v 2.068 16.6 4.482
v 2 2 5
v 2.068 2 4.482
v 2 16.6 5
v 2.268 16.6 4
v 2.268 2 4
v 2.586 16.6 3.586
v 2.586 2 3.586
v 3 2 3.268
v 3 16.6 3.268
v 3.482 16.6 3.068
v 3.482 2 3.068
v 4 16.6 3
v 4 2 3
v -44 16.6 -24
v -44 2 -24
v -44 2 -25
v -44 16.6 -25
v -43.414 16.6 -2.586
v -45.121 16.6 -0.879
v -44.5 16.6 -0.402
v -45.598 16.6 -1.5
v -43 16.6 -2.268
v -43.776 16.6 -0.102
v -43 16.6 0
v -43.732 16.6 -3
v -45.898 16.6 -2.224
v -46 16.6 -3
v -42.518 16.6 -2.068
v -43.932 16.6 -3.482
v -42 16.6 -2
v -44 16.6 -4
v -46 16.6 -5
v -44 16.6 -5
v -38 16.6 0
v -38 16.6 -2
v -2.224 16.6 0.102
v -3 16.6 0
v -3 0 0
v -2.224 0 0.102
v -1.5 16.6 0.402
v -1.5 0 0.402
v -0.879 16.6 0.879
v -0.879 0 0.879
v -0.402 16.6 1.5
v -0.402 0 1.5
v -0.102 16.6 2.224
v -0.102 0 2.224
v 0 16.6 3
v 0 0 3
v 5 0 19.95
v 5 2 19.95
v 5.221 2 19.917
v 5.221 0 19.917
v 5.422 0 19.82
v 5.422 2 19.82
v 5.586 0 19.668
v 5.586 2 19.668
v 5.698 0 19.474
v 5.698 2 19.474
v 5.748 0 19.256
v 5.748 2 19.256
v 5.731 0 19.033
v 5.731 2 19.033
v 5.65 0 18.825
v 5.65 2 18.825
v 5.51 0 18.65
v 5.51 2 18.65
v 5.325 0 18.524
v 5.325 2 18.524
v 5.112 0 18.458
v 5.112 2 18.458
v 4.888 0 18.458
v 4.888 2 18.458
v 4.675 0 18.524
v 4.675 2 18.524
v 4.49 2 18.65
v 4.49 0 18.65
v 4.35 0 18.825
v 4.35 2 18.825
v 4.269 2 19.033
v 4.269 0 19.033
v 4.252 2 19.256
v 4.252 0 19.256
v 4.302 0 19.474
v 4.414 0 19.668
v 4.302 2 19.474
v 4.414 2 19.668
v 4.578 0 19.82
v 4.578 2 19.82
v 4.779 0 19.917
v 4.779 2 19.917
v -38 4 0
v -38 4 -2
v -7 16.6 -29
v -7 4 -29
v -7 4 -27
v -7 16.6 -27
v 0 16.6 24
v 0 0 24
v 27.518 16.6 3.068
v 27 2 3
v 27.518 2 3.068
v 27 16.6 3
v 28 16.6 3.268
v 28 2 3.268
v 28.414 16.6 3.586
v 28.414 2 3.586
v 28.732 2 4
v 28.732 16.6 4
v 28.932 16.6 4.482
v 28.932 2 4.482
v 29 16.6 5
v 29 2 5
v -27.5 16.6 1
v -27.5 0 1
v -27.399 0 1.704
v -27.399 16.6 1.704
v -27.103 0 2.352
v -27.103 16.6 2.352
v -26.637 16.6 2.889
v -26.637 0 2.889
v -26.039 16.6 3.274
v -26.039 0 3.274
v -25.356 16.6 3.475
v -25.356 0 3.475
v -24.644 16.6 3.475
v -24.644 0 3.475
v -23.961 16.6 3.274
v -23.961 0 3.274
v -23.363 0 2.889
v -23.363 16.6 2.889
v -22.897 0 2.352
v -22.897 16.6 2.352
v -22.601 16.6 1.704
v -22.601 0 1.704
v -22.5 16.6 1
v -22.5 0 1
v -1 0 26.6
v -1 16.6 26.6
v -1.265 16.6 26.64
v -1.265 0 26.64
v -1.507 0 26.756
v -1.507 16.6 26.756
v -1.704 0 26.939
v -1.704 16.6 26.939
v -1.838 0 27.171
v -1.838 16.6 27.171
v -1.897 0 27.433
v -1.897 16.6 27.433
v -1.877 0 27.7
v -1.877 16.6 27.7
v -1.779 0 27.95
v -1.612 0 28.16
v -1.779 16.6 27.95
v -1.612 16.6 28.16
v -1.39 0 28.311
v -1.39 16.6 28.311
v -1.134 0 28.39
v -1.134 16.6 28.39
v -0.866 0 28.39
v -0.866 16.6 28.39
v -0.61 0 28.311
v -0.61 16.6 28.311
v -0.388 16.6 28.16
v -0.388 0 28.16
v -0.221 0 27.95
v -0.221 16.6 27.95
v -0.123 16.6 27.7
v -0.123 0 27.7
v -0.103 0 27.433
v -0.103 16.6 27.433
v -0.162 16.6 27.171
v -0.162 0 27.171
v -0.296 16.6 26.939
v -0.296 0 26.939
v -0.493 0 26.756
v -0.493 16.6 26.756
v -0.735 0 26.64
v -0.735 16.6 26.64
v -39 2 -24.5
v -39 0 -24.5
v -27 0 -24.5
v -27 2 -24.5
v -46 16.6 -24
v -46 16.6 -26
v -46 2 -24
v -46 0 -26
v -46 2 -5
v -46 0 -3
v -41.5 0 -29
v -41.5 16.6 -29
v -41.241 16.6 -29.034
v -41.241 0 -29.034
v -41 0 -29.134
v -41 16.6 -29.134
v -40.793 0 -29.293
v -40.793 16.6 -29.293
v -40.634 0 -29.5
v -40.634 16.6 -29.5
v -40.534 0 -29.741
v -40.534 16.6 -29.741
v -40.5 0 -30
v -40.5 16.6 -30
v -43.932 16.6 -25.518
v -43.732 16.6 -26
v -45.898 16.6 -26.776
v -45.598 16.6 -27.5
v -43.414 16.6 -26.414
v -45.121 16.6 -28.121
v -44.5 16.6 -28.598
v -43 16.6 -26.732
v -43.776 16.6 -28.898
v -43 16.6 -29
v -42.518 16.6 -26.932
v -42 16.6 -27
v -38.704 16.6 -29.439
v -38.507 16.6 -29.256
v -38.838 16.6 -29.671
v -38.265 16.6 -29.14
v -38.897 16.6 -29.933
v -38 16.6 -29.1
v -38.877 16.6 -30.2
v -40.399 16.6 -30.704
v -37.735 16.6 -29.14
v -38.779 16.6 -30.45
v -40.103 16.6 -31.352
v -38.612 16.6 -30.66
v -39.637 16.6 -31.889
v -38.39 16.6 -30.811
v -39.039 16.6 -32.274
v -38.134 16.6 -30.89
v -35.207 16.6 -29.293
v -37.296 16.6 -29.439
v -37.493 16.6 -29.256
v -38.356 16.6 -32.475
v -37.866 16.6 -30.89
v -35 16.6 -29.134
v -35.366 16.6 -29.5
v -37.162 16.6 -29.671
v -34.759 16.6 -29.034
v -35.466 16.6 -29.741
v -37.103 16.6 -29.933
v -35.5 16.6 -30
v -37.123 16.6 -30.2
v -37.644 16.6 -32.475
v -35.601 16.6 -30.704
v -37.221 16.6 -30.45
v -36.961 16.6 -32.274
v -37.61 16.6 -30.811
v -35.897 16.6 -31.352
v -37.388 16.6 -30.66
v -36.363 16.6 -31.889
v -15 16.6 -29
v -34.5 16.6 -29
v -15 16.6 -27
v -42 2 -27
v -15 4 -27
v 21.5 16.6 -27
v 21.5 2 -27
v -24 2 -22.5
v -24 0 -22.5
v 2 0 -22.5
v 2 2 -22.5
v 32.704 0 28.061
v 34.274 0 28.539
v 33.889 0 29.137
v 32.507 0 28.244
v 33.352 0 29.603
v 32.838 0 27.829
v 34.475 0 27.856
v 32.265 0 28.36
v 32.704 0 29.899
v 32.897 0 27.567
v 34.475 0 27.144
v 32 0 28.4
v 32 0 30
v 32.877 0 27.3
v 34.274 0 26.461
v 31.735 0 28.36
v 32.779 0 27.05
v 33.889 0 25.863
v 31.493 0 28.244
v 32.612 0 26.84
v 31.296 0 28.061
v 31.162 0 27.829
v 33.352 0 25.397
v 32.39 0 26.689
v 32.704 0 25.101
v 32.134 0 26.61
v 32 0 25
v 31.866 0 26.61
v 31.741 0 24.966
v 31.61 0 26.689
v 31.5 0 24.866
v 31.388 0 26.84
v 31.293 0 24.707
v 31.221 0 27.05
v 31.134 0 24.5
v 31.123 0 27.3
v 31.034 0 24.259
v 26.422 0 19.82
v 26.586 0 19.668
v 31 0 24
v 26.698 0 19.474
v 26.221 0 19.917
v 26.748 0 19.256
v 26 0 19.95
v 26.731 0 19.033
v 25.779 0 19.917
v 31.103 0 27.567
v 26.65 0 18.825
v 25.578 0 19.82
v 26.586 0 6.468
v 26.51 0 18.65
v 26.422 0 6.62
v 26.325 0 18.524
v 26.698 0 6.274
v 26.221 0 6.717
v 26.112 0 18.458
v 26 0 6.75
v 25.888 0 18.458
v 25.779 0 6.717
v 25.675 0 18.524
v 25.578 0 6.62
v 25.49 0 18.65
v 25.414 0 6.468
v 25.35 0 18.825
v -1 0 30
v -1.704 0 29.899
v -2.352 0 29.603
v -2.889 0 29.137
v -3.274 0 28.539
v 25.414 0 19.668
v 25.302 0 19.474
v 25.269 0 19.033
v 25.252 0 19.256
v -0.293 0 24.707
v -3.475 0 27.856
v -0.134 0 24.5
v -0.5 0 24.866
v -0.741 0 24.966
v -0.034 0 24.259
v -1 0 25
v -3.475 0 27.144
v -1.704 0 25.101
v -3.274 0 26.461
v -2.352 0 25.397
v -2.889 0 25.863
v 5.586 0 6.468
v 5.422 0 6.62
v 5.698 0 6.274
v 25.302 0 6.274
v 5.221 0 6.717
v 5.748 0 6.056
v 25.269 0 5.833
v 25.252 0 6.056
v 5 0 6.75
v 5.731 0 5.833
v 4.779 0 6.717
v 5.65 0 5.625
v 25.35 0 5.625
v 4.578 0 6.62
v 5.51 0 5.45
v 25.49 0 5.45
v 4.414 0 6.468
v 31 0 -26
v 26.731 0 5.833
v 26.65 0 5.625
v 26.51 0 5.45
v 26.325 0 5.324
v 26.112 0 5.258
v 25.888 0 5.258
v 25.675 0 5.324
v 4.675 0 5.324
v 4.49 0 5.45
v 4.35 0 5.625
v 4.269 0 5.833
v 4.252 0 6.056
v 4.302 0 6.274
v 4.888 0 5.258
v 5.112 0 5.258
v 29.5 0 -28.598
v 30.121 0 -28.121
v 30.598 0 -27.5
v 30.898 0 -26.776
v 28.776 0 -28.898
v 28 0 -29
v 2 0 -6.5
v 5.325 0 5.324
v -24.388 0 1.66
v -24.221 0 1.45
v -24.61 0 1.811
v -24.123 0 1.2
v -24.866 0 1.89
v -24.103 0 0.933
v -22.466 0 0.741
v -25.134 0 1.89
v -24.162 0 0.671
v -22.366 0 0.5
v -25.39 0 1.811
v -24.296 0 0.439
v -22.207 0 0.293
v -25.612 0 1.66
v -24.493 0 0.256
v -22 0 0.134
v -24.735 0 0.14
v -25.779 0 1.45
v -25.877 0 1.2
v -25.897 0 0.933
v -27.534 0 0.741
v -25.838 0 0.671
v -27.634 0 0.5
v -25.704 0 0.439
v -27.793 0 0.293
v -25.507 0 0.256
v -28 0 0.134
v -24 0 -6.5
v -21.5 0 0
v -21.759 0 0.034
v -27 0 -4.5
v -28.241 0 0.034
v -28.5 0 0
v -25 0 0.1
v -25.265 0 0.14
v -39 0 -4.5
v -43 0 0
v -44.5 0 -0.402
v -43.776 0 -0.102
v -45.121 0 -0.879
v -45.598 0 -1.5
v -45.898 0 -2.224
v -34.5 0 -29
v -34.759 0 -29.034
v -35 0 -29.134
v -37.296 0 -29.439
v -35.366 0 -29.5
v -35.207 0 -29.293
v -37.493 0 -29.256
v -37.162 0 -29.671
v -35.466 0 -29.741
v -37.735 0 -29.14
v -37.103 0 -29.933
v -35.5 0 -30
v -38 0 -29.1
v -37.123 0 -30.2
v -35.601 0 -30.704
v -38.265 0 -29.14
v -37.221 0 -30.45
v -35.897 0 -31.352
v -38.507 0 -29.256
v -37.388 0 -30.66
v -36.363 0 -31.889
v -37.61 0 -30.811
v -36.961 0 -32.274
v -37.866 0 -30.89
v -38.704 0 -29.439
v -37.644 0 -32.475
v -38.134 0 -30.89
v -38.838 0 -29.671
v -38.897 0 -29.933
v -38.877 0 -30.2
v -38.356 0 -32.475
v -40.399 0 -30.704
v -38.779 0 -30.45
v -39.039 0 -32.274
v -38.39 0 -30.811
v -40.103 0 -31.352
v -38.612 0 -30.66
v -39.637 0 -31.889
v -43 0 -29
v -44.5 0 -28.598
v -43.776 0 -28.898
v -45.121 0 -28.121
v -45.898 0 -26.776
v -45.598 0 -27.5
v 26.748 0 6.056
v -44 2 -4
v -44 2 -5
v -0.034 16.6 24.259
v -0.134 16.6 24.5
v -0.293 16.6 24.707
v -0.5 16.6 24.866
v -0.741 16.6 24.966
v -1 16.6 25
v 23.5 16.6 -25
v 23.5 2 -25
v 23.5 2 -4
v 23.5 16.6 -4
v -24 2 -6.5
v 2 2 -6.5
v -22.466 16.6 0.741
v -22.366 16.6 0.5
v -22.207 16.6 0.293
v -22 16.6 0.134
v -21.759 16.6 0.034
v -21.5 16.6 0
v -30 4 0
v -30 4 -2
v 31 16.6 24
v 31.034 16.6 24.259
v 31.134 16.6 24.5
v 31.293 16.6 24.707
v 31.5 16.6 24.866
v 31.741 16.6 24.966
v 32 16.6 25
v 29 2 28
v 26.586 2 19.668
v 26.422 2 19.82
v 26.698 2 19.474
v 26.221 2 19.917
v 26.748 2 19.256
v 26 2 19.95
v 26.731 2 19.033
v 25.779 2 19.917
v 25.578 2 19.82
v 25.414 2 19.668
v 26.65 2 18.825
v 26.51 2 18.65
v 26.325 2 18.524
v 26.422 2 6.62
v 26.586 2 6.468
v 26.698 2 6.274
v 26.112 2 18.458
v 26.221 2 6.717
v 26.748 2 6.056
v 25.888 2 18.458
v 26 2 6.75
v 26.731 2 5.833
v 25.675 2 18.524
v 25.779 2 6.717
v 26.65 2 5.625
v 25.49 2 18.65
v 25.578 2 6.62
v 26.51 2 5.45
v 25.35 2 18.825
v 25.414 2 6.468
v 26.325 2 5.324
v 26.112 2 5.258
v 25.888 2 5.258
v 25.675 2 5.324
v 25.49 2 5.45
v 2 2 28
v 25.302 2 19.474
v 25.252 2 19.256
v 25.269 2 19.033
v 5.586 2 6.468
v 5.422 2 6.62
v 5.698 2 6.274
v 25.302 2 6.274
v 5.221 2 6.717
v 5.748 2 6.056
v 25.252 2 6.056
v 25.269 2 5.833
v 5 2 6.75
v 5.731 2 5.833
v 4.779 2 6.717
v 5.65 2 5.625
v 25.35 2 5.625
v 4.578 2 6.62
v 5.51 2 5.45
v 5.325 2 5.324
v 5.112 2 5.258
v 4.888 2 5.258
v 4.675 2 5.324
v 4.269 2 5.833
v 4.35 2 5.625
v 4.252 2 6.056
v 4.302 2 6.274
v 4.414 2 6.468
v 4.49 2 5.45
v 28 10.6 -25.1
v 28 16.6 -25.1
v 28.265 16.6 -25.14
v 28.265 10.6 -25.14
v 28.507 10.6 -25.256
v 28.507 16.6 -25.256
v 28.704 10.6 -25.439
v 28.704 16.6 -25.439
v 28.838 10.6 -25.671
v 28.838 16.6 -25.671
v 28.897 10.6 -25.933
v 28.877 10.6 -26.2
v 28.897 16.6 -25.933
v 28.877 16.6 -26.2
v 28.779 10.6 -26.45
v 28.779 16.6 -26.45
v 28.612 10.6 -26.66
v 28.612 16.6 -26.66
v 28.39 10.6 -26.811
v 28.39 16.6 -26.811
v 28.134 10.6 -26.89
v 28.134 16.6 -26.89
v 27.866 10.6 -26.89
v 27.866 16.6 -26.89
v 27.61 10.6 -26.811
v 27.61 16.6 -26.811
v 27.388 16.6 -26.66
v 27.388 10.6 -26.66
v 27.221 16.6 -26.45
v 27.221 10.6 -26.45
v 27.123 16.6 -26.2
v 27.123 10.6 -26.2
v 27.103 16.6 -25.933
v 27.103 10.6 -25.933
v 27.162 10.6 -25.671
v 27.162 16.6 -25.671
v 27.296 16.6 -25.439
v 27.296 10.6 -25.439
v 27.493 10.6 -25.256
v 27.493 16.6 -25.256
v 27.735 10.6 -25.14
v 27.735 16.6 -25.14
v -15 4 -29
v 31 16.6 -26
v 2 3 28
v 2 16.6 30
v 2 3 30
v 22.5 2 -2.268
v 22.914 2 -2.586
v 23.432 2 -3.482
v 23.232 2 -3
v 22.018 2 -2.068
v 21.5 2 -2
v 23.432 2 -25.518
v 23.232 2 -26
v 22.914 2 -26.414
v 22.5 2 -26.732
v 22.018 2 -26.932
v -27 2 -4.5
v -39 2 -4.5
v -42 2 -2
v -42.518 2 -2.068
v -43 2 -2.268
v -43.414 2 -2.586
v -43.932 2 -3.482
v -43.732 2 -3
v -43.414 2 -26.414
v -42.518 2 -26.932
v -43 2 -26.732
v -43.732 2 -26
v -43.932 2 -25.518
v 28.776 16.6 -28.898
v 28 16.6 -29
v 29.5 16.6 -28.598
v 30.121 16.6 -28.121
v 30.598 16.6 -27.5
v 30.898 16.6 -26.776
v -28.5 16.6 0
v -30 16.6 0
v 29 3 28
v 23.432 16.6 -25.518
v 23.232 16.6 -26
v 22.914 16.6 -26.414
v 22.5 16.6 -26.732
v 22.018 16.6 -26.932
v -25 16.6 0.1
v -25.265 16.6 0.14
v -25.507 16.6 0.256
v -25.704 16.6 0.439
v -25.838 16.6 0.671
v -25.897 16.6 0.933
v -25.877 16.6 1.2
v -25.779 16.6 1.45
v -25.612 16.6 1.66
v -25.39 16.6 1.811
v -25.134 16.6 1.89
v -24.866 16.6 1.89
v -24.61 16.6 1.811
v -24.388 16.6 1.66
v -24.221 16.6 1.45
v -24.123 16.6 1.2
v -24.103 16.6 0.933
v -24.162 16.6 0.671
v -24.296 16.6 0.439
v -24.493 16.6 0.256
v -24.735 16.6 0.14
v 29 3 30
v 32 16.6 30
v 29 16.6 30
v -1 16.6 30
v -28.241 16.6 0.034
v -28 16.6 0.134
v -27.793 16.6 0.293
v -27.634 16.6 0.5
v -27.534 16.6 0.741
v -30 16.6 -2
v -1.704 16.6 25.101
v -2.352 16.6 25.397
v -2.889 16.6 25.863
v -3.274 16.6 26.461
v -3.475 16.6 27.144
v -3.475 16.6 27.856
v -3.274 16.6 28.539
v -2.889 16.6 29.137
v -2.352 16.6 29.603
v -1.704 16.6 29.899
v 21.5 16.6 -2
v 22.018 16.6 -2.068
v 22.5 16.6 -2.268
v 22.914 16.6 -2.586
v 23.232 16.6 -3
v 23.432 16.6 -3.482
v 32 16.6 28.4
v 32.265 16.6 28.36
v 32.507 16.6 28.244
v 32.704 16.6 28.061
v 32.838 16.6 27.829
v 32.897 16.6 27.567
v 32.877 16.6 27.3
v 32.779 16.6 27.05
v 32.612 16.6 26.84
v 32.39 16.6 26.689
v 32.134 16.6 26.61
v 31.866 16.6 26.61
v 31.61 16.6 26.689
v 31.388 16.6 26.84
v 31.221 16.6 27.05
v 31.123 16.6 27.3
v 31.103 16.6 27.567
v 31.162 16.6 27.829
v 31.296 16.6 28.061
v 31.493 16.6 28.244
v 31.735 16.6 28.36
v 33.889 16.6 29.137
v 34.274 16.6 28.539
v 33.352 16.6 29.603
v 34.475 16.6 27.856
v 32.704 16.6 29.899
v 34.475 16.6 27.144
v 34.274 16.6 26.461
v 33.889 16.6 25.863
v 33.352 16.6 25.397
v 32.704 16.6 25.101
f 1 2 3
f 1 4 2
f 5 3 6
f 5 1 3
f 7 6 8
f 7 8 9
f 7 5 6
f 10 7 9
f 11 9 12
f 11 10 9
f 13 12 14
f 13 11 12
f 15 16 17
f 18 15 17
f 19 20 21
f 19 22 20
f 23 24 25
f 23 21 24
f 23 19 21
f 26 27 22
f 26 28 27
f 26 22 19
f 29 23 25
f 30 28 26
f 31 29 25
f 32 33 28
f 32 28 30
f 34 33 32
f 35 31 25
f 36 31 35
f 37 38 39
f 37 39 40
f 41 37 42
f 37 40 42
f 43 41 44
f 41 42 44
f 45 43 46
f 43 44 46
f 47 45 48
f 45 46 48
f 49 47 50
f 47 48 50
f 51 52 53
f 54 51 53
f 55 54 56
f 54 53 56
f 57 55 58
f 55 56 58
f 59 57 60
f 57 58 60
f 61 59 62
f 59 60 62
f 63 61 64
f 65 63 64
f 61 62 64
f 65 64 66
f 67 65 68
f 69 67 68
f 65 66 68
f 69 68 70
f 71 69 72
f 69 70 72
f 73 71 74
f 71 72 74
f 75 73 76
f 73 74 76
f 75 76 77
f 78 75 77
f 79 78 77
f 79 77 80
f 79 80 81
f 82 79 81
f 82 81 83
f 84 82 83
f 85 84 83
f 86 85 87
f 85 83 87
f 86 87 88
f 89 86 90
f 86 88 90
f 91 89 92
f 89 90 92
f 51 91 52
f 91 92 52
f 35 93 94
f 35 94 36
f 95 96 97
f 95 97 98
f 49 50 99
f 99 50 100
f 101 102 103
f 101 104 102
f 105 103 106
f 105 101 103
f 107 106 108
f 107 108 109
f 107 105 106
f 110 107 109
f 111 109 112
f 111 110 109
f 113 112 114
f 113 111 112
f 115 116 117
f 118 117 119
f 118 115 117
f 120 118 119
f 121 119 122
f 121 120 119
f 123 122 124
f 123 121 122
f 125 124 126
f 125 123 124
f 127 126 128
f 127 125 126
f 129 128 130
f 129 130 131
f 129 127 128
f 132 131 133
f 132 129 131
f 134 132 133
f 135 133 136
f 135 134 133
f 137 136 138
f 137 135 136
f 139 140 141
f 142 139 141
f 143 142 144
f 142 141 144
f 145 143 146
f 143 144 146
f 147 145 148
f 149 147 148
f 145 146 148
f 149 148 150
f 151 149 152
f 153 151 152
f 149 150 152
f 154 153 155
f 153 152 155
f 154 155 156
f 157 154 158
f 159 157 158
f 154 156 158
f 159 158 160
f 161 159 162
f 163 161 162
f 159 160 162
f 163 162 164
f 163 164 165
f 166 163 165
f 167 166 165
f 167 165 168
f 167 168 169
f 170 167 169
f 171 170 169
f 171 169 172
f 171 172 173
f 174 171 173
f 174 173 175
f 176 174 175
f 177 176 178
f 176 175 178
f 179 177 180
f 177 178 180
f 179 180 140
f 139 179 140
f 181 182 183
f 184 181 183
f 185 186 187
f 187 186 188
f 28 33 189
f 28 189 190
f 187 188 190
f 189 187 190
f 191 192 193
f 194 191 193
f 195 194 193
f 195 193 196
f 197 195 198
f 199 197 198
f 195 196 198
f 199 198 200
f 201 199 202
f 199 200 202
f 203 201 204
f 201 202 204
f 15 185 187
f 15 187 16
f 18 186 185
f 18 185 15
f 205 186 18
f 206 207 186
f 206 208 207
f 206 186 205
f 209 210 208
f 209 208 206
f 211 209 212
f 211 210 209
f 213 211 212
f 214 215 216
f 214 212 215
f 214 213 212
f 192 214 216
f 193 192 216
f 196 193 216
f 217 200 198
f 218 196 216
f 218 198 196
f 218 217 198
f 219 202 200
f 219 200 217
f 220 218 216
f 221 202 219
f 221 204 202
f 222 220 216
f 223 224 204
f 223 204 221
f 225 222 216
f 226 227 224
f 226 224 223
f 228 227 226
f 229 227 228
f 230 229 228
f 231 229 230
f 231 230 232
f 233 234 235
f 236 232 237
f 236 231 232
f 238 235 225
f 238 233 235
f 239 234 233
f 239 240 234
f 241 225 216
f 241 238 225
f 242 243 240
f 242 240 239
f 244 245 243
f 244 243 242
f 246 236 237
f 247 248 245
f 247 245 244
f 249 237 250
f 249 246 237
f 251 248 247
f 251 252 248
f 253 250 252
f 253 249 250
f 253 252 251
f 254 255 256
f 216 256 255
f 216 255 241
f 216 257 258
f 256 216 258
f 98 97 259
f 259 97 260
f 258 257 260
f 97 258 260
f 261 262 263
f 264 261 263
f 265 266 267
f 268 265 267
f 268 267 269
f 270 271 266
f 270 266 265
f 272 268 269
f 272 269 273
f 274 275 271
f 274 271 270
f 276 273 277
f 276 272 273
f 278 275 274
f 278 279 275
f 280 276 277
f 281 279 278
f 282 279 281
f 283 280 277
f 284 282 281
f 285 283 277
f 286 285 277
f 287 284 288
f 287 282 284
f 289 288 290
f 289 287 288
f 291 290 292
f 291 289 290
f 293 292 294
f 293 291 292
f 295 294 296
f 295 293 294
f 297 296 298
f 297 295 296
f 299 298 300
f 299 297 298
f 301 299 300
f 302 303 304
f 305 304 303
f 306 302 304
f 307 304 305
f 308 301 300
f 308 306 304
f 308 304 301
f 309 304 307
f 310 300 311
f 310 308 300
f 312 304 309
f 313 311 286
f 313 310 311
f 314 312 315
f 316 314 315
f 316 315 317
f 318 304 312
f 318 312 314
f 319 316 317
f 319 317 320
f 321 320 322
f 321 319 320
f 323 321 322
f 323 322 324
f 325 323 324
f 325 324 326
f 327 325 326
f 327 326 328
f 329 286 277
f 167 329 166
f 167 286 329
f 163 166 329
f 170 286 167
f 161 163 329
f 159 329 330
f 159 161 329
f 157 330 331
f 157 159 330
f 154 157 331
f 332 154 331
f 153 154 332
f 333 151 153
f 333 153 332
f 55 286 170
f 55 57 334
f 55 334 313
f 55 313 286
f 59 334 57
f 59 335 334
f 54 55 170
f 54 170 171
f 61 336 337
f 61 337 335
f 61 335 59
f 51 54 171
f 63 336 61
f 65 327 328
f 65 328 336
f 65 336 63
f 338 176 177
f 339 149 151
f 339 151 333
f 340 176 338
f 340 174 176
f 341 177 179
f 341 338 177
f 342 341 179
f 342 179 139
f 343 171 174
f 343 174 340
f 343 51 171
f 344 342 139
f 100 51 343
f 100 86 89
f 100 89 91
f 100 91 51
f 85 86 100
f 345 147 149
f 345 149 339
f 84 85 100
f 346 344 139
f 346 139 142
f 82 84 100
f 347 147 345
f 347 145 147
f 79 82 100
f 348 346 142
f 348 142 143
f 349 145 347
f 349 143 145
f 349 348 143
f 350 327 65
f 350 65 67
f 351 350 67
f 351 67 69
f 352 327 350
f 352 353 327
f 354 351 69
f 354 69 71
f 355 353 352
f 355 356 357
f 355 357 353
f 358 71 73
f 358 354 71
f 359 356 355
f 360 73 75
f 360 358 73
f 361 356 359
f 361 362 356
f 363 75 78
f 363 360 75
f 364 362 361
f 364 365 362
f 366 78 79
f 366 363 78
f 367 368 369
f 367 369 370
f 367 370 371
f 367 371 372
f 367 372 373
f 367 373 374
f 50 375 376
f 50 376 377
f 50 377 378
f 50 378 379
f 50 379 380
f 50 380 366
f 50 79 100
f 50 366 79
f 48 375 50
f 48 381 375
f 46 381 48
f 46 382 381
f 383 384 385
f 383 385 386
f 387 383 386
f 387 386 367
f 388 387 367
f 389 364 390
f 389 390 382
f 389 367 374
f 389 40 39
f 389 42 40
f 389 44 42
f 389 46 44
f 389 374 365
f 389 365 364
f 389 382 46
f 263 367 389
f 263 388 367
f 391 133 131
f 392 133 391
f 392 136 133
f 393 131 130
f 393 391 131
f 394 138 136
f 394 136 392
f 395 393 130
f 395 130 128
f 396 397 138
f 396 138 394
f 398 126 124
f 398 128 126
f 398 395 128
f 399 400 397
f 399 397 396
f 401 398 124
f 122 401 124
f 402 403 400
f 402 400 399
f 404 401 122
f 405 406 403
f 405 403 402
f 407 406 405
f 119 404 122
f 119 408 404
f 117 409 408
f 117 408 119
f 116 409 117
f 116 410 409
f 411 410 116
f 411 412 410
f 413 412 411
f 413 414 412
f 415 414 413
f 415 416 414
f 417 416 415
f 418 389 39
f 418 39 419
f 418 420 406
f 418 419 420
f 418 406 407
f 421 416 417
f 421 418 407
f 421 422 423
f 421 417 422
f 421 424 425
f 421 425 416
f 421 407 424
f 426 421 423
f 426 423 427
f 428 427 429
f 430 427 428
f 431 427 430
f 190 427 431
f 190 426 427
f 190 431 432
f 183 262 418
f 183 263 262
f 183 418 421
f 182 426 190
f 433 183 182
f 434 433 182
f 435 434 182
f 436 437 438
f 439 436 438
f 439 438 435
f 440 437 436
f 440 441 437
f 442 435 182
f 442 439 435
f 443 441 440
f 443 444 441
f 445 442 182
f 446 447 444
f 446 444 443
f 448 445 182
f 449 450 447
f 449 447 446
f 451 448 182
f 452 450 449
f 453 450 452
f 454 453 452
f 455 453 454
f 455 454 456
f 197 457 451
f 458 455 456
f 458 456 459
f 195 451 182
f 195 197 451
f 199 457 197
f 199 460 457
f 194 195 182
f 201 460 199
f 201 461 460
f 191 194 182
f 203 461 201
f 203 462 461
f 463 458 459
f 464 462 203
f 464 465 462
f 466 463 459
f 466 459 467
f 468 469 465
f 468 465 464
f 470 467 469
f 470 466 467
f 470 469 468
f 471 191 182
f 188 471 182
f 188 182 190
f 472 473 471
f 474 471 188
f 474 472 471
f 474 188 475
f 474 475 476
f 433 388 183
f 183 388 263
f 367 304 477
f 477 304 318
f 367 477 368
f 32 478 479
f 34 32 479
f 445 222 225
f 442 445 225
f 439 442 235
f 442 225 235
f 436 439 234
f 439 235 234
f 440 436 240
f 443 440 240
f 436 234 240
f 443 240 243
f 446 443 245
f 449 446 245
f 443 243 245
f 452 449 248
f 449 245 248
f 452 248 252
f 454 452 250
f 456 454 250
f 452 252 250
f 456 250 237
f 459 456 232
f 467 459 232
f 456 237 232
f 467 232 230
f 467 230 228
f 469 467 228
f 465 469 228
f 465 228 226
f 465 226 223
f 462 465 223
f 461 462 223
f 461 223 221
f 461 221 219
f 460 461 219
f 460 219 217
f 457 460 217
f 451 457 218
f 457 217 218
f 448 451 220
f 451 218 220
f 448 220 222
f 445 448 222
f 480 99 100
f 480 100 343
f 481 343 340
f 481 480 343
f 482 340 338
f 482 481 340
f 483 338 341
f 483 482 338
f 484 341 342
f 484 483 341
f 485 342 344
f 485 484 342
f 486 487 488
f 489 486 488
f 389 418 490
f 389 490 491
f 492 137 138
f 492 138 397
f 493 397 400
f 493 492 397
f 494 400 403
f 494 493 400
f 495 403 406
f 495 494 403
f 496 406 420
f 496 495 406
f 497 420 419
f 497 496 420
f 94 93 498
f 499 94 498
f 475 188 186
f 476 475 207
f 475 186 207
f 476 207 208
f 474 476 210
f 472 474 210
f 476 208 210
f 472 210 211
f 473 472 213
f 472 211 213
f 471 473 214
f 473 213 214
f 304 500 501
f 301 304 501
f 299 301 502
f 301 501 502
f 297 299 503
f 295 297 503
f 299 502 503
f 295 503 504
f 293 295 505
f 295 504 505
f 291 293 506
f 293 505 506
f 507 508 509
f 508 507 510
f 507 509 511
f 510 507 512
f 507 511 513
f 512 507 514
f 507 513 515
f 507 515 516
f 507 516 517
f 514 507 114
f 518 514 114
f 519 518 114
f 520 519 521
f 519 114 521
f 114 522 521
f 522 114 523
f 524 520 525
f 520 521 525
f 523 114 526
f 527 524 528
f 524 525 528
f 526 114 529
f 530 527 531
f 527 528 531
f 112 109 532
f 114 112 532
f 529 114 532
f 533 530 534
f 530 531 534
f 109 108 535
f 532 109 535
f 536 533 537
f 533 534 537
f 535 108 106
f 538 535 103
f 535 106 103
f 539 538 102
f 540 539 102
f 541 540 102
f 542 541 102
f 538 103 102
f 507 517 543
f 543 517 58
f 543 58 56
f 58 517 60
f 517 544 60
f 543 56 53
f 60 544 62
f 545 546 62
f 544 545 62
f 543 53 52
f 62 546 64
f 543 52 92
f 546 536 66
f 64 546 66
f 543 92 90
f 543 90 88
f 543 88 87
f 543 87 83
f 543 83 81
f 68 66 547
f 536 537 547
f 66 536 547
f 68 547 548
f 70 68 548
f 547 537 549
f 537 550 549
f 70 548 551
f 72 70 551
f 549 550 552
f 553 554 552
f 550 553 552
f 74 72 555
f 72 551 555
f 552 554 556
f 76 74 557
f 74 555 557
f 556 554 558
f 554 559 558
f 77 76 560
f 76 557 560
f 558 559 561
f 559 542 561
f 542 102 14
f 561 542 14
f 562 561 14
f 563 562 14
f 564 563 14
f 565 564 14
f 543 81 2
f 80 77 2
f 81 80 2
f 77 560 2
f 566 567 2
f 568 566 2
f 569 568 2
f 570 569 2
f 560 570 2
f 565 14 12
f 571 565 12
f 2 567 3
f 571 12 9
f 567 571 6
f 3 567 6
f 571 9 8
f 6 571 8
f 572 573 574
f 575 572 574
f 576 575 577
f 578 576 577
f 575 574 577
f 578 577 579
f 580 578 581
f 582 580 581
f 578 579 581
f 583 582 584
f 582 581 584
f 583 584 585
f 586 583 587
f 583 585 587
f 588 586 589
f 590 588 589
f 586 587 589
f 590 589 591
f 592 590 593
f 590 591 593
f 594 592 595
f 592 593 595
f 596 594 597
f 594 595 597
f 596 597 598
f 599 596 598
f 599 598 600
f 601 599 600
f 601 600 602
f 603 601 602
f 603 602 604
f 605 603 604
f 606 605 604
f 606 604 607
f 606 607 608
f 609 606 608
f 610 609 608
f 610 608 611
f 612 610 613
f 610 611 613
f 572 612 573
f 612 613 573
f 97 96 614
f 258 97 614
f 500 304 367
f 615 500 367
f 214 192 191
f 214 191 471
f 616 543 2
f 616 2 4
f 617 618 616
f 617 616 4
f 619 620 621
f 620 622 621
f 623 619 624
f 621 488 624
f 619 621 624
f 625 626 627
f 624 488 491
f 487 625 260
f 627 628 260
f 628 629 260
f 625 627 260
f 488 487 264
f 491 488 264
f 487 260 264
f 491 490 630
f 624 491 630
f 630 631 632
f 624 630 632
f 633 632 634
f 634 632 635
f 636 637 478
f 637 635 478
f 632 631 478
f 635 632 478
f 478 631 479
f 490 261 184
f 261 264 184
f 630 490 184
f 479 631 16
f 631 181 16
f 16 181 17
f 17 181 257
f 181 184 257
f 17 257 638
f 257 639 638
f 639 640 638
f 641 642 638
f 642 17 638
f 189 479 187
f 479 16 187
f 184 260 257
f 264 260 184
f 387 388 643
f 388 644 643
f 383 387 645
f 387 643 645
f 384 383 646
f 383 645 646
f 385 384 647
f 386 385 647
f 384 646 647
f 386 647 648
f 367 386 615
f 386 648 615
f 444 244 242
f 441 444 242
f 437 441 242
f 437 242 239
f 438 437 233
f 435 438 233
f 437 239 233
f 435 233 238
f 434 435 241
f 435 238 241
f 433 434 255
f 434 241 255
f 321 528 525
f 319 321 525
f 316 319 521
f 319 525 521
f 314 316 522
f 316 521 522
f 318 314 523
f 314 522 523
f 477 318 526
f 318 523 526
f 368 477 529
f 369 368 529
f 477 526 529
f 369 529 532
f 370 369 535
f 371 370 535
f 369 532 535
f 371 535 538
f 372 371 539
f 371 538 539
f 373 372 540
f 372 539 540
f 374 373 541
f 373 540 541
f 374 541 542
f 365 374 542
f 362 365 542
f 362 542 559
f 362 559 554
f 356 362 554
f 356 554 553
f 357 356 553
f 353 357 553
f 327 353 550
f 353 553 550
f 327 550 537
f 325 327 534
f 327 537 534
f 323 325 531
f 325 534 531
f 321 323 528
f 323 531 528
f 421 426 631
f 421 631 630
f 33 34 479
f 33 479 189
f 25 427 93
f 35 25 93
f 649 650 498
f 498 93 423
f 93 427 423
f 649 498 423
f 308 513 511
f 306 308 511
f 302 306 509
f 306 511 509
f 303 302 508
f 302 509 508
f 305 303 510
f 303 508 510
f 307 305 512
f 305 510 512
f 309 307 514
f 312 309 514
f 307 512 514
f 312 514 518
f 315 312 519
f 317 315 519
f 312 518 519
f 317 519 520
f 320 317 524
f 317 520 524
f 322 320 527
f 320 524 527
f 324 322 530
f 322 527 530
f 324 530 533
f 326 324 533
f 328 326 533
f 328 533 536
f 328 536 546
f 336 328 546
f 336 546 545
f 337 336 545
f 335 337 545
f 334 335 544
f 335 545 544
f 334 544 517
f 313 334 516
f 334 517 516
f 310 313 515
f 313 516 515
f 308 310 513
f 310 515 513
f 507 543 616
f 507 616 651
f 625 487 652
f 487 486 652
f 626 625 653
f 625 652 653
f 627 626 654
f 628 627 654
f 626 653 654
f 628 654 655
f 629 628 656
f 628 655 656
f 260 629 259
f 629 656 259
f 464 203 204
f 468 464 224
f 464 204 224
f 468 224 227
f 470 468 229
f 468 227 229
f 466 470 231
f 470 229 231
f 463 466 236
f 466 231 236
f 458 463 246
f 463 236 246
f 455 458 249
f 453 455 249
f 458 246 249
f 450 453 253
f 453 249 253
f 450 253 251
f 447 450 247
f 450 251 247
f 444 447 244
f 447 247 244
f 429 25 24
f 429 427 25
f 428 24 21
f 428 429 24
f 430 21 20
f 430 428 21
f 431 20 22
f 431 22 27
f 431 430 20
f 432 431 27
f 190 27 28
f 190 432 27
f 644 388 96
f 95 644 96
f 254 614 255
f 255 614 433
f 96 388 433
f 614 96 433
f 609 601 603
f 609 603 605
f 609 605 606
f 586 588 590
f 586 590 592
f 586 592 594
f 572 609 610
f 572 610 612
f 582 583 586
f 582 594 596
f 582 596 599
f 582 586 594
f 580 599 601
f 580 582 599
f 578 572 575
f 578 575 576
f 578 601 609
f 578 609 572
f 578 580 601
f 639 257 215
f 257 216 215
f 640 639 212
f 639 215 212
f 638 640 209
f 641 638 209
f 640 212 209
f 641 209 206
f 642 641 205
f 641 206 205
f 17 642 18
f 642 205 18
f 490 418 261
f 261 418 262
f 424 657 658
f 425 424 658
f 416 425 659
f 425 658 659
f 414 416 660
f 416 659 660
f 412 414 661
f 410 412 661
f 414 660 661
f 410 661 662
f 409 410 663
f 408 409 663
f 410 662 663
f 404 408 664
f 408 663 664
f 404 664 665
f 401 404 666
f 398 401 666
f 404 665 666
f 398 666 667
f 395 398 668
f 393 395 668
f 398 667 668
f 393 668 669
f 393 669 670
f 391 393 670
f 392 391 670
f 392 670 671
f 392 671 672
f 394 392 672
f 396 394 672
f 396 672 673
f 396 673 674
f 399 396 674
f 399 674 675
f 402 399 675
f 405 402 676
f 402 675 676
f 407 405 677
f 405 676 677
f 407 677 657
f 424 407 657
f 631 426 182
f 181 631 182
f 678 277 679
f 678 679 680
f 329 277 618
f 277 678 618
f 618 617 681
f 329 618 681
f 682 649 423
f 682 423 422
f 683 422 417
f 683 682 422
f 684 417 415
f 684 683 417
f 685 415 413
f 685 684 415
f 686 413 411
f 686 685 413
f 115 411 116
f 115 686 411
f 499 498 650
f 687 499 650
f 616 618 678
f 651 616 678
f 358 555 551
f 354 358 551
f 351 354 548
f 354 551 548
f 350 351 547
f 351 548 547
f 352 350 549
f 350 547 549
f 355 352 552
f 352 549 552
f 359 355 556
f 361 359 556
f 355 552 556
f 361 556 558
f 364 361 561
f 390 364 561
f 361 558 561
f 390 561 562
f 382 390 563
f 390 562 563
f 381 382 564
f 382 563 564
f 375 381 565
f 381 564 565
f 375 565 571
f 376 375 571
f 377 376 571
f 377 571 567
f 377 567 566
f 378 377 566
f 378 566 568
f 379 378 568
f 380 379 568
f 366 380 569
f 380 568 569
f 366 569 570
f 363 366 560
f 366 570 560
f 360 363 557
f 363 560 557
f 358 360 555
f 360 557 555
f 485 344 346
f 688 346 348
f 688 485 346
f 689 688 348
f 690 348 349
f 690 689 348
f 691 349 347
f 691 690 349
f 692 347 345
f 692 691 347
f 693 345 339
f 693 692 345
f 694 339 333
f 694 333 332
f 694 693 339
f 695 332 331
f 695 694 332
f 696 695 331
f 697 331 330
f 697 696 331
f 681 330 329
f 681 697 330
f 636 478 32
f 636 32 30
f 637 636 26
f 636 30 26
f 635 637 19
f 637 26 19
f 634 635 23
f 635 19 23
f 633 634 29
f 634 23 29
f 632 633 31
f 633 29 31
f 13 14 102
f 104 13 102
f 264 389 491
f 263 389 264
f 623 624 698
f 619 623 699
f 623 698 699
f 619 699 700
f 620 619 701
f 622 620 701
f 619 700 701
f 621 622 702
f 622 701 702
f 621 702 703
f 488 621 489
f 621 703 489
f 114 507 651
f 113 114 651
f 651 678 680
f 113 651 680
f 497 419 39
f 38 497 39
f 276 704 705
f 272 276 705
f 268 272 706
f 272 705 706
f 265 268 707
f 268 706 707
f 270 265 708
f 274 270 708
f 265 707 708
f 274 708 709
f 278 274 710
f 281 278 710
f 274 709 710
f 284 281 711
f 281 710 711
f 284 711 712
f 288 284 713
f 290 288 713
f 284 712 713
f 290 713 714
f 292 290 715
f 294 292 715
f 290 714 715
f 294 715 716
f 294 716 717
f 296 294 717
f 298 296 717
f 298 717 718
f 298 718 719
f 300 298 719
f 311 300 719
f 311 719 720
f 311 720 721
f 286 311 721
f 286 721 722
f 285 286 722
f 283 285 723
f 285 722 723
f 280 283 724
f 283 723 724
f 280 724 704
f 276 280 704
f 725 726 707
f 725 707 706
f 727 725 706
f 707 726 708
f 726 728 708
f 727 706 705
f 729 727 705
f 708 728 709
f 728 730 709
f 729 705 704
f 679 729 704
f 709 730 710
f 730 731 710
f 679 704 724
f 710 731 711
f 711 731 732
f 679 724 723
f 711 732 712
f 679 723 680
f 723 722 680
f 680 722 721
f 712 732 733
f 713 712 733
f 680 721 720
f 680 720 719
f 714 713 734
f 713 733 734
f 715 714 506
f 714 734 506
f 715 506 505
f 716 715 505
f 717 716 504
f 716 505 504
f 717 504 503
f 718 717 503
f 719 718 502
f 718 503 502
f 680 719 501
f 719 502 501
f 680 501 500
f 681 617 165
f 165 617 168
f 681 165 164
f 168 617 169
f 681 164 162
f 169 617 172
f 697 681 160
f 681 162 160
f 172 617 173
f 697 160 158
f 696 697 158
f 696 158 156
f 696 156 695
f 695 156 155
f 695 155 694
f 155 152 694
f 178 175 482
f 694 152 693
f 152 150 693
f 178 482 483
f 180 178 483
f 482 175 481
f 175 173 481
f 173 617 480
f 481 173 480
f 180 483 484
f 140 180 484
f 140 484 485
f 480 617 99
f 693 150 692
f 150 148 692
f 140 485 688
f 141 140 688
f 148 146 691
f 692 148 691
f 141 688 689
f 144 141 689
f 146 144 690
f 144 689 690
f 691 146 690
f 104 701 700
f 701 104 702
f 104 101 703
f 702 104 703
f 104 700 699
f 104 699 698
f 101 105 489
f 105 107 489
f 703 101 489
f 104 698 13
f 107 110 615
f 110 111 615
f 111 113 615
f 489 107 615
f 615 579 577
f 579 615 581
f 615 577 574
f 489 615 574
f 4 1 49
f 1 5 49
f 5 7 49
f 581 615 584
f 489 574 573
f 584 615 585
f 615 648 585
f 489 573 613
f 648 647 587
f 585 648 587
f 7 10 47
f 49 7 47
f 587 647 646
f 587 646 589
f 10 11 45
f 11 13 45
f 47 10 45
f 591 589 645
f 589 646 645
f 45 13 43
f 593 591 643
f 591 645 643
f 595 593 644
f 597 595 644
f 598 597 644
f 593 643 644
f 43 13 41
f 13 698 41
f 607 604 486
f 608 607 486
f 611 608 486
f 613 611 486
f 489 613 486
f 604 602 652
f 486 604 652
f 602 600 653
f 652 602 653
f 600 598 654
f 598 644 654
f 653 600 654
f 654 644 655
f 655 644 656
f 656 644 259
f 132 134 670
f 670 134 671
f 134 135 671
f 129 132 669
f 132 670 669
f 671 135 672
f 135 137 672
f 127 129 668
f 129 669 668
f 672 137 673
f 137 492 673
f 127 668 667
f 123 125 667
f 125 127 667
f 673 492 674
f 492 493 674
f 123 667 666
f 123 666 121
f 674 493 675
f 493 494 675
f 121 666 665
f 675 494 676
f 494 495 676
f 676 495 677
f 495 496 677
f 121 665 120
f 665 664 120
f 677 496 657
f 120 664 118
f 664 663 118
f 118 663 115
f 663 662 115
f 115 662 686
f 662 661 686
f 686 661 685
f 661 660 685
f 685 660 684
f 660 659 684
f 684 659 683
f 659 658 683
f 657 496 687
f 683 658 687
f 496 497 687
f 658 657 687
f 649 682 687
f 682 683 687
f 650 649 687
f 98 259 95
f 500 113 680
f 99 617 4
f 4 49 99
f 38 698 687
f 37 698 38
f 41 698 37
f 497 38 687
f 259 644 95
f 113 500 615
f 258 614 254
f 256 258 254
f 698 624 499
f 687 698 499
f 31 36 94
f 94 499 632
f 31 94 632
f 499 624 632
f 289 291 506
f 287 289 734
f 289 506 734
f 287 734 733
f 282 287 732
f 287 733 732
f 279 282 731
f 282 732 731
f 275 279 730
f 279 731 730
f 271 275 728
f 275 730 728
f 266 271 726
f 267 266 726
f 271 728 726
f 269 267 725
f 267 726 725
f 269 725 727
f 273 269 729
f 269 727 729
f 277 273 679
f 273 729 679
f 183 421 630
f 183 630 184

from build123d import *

# Parameters (mm, degrees)
CROQUIS1_W              = 12
CROQUIS1_H              = 20
CROQUIS1_W_2            = 26
CROQUIS1_H_2            = 16
SALIENTE_EXTRUIR1_DEPTH = 2
CROQUIS2_W              = 27
CROQUIS2_H              = 25
SALIENTE_EXTRUIR2_DEPTH = 14.6
CROQUIS3_W              = 27
CROQUIS3_H              = 13.6
CORTAR_EXTRUIR1_DEPTH   = 2
REDONDEO1_R             = 3
REDONDEO2_R             = 2
CROQUIS4_W              = 8
CROQUIS4_H              = 12.6
CORTAR_EXTRUIR2_DEPTH   = 2
CROQUIS5_W              = 8
CROQUIS5_H              = 12.6
CORTAR_EXTRUIR3_DEPTH   = 2
CROQUIS6_R              = 0.75
CORTAR_EXTRUIR4_DEPTH   = 2
CROQUIS7_R              = 0.9
SALIENTE_EXTRUIR3_DEPTH = 16.6
CROQUIS8_R              = 0.9
CORTAR_EXTRUIR5_DEPTH   = 6


with BuildPart() as part:
    # Croquis1 → Saliente-Extruir1 (new body)
    with BuildSketch(Plane(origin=(0, 0, 0), x_dir=(1, 0, 0), z_dir=(0, 1, 0))):
        Polygon((31, 29), (31, -30), (0, -30), (0, 0), (-46, 0), (-46, 29), align=None)
        with Locations((-33, 14.5)):
            Rectangle(CROQUIS1_W, CROQUIS1_H, mode=Mode.SUBTRACT)
        with Locations((-11, 14.5)):
            Rectangle(CROQUIS1_W_2, CROQUIS1_H_2, mode=Mode.SUBTRACT)
    extrude(amount=SALIENTE_EXTRUIR1_DEPTH)

    # Croquis2 → Saliente-Extruir2 (add)
    with BuildSketch(Plane(origin=(0, 2, 0), x_dir=(1, 0, 0), z_dir=(0, 1, 0))):
        Polygon((0, -30), (31, -30), (31, 29), (-46, 29), (-46, 24), (-44, 24), (-44, 27), (23.5, 27), (23.5, 2), (-44, 2), (-44, 5), (-46, 5), (-46, 0), (0, 0), align=None)
        with Locations((15.5, -15.5)):
            Rectangle(CROQUIS2_W, CROQUIS2_H, mode=Mode.SUBTRACT)
    extrude(amount=SALIENTE_EXTRUIR2_DEPTH)

    # Croquis3 → Cortar-Extruir1 (cut)
    with BuildSketch(Plane.XY.offset(30)):
        with Locations((15.5, 9.8)):
            Rectangle(CROQUIS3_W, CROQUIS3_H)
    extrude(amount=-CORTAR_EXTRUIR1_DEPTH, mode=Mode.SUBTRACT)

    # Redondeo1
    redondeo1_edges = [part.edges().sort_by_distance(p)[0] for p in [
        (0, 8.3, 0),
        (-46, 8.3, 0),
        (-46, 8.3, -29),
        (31, 8.3, -29),
    ]]
    fillet(redondeo1_edges, radius=REDONDEO1_R)

    # Redondeo2
    redondeo2_edges = [part.edges().sort_by_distance(p)[0] for p in [
        (-44, 9.3, -27),
        (23.5, 9.3, -27),
        (23.5, 9.3, -2),
        (-44, 9.3, -2),
        (29, 9.3, 3),
        (2, 9.3, 3),
    ]]
    fillet(redondeo2_edges, radius=REDONDEO2_R)

    # Croquis4 → Cortar-Extruir2 (cut)
    with BuildSketch(Plane.XY):
        with Locations((-34, 10.3)):
            Rectangle(CROQUIS4_W, CROQUIS4_H)
    extrude(amount=-CORTAR_EXTRUIR2_DEPTH, mode=Mode.SUBTRACT)

    # Croquis5 → Cortar-Extruir3 (cut)
    with BuildSketch(Plane(origin=(0, 0, -29), x_dir=(-1, 0, 0), z_dir=(0, 0, -1))):
        with Locations((11, 10.3)):
            Rectangle(CROQUIS5_W, CROQUIS5_H)
    extrude(amount=-CORTAR_EXTRUIR3_DEPTH, mode=Mode.SUBTRACT)

    # Croquis6 → Cortar-Extruir4 (cut)
    with BuildSketch(Plane(origin=(0, 2, 0), x_dir=(1, 0, 0), z_dir=(0, 1, 0))):
        with Locations(Location((26, -6, 0), (0, 0, 270))):
            Circle(CROQUIS6_R)
        with Locations(Location((5, -6, 0), (0, 0, 270))):
            Circle(CROQUIS6_R)
        with Locations(Location((5, -19.2, 0), (0, 0, 270))):
            Circle(CROQUIS6_R)
        with Locations(Location((26, -19.2, 0), (0, 0, 270))):
            Circle(CROQUIS6_R)
    extrude(amount=-CORTAR_EXTRUIR4_DEPTH, mode=Mode.SUBTRACT)

    # Croquis7 → Saliente-Extruir3 (add)
    # profile 1 of 4: a face of its own
    with BuildSketch(Plane(origin=(0, 16.6, 0), x_dir=(1, 0, 0), z_dir=(0, 1, 0))):
        with BuildLine():
            Line((31, -30), (31, -24))
            ThreePointArc((31, -24), (31.292893219, -24.707106781), (32, -25))
            ThreePointArc((32, -25), (34.5, -27.5), (32, -30))
            Line((32, -30), (31, -30))
        make_face()
        with Locations(Location((32, -27.5, 0), (0, 0, 270))):
            Circle(CROQUIS7_R, mode=Mode.SUBTRACT)
    # profile 2 of 4: a face of its own
    with BuildSketch(Plane(origin=(0, 16.6, 0), x_dir=(1, 0, 0), z_dir=(0, 1, 0))):
        with BuildLine():
            Line((-1, -30), (0, -30))
            Line((0, -30), (0, -24))
            ThreePointArc((0, -24), (-0.292893219, -24.707106781), (-1, -25))
            ThreePointArc((-1, -25), (-3.5, -27.5), (-1, -30))
        make_face()
        with Locations(Location((-1, -27.5, 0), (0, 0, 90))):
            Circle(CROQUIS7_R, mode=Mode.SUBTRACT)
    # profile 3 of 4: a face of its own
    with BuildSketch(Plane(origin=(0, 16.6, 0), x_dir=(1, 0, 0), z_dir=(0, 1, 0))):
        with BuildLine():
            Line((-34.5, 29), (-41.5, 29))
            ThreePointArc((-41.5, 29), (-40.792893219, 29.292893219), (-40.5, 30))
            ThreePointArc((-40.5, 30), (-38, 32.5), (-35.5, 30))
            ThreePointArc((-35.5, 30), (-35.207106781, 29.292893219), (-34.5, 29))
        make_face()
        with Locations(Location((-38, 30, 0), (0, 0, 270))):
            Circle(CROQUIS7_R, mode=Mode.SUBTRACT)
    # profile 4 of 4: a face of its own
    with BuildSketch(Plane(origin=(0, 16.6, 0), x_dir=(1, 0, 0), z_dir=(0, 1, 0))):
        with BuildLine():
            Line((-21.5, 0), (-28.5, 0))
            ThreePointArc((-28.5, 0), (-27.792893219, -0.292893219), (-27.5, -1))
            ThreePointArc((-27.5, -1), (-25, -3.5), (-22.5, -1))
            ThreePointArc((-22.5, -1), (-22.207106781, -0.292893219), (-21.5, 0))
        make_face()
        with Locations(Location((-25, -1, 0), (0, 0, 90))):
            Circle(CROQUIS7_R, mode=Mode.SUBTRACT)
    extrude(amount=-SALIENTE_EXTRUIR3_DEPTH)

    # Croquis8 → Cortar-Extruir5 (cut)
    with BuildSketch(Plane(origin=(0, 16.6, 0), x_dir=(1, 0, 0), z_dir=(0, 1, 0))):
        with Locations(Location((28, 26, 0), (0, 0, 270))):
            Circle(CROQUIS8_R)
    extrude(amount=-CORTAR_EXTRUIR5_DEPTH, mode=Mode.SUBTRACT)


solid = part.part
